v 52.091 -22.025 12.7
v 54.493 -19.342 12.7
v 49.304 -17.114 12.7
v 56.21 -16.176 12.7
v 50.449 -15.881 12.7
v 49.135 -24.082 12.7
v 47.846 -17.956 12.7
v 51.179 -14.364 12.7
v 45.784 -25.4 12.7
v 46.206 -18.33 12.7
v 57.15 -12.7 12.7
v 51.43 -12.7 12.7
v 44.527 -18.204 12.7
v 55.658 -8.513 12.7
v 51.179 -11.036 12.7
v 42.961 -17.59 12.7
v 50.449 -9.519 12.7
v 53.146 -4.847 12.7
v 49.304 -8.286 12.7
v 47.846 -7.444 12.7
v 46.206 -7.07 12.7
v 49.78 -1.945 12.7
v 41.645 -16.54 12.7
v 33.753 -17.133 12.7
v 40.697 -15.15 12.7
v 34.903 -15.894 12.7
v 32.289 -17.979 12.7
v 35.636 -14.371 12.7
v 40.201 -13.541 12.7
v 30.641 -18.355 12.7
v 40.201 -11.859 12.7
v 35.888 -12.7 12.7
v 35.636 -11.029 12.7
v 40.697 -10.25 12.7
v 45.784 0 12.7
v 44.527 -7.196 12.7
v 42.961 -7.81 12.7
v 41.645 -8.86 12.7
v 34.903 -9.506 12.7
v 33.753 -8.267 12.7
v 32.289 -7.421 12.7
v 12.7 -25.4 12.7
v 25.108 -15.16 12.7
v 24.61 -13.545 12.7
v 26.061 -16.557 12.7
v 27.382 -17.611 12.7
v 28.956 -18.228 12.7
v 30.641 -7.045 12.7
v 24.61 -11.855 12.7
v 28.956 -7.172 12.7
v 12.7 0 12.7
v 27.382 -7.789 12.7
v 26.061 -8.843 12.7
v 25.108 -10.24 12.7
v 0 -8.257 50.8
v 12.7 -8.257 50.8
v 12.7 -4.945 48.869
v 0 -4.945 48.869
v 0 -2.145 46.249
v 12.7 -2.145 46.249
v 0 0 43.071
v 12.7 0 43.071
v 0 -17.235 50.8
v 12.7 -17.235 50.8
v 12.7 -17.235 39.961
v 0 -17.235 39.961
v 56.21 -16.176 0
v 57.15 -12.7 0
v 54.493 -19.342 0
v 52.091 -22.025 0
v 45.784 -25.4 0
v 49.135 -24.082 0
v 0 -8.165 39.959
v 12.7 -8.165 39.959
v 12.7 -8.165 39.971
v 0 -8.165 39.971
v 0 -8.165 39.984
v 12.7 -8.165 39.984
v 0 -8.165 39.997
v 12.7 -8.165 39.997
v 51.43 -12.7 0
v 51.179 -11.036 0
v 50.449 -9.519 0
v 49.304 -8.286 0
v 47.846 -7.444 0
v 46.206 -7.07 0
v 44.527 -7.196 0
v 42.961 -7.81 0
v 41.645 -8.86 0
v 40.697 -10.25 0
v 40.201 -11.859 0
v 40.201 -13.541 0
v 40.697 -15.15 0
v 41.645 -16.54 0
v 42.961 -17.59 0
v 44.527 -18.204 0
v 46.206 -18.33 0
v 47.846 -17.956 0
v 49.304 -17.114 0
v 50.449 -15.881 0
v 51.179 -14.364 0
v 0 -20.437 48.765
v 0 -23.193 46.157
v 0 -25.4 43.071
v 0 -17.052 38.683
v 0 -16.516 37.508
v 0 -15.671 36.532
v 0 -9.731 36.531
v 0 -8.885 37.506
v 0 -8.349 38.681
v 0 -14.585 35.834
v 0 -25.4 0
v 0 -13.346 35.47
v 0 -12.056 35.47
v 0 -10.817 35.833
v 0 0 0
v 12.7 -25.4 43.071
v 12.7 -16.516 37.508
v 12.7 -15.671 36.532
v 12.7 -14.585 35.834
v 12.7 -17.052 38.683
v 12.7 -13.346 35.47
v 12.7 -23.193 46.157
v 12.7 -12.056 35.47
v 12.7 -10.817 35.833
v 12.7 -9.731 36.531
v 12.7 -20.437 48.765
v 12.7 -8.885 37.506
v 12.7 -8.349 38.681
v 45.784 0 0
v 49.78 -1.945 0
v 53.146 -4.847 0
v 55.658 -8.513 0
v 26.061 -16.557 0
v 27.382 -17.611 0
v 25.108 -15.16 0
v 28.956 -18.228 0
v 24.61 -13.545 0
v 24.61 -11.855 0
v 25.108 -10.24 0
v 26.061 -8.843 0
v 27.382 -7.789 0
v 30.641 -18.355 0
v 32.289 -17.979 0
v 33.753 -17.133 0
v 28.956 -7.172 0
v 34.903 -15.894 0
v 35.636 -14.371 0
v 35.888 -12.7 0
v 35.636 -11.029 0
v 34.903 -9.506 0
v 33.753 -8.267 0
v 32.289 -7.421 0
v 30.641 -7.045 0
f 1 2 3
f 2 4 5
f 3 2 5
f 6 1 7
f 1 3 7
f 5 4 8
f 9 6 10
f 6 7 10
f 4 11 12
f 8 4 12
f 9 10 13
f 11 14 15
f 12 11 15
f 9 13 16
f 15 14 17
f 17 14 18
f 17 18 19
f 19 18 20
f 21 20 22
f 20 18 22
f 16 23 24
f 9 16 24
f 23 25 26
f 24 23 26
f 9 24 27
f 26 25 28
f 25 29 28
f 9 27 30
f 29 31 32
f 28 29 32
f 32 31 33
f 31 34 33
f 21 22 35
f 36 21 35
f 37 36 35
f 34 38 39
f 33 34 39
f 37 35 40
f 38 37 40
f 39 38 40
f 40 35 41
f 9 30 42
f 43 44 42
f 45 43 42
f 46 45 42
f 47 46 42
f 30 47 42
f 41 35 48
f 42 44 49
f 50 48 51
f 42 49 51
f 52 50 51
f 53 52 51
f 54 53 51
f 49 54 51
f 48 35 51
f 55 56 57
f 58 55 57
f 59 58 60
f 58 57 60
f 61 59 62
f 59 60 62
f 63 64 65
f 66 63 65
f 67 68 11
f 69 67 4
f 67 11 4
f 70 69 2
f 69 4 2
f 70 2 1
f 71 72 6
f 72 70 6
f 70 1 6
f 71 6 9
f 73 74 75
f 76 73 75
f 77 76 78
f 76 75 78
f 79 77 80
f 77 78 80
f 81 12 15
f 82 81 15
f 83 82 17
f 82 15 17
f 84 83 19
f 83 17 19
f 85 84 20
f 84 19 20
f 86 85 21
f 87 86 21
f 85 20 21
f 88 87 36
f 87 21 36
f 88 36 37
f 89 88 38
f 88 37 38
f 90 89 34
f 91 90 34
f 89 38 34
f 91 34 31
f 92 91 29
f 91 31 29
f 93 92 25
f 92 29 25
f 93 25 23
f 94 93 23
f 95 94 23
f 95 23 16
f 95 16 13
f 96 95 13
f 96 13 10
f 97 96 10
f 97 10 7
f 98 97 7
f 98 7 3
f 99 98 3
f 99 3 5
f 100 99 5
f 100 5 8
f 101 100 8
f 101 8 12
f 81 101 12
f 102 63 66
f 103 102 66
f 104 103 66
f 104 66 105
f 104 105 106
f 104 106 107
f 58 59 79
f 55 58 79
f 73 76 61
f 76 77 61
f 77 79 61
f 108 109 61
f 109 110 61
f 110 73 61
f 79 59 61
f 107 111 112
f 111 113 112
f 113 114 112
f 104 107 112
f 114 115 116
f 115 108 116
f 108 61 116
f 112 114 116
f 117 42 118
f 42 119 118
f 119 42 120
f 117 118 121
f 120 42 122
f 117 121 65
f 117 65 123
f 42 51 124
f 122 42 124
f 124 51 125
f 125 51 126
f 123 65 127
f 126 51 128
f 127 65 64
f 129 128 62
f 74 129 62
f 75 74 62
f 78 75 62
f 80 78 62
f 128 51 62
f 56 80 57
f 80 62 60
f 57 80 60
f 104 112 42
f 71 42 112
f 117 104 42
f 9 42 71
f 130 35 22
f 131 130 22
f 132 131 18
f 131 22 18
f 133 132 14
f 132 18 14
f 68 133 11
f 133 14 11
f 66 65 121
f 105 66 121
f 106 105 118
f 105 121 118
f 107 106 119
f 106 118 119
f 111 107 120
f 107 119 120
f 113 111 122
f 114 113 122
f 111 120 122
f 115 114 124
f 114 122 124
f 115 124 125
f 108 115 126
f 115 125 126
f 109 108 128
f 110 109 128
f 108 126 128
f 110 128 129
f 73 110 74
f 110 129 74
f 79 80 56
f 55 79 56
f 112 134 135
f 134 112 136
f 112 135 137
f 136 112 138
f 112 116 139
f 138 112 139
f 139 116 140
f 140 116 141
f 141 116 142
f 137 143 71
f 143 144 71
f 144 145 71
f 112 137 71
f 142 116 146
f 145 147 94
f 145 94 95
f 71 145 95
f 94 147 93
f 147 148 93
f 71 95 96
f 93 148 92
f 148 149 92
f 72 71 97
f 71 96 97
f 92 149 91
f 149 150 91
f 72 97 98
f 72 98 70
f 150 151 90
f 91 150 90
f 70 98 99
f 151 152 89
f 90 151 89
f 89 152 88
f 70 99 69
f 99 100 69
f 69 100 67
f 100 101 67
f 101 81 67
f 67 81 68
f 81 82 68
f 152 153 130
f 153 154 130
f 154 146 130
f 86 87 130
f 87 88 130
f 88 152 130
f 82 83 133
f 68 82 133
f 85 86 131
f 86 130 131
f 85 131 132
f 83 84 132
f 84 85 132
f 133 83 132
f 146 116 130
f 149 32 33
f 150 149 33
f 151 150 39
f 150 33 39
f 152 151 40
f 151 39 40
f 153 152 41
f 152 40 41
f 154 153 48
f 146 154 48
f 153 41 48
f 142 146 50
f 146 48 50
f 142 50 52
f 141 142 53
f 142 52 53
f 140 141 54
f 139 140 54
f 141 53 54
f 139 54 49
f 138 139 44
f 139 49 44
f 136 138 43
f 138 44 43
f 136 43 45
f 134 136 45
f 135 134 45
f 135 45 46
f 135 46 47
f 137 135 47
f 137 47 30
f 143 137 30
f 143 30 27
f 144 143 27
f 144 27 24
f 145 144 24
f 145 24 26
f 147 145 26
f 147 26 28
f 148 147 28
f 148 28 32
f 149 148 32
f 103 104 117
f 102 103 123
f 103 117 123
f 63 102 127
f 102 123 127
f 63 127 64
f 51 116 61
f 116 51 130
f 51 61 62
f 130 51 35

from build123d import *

# Parameters (mm, degrees)
F1_DEPTH = 25.4
F3_DEPTH = 25.4
F5_DEPTH = 25.4
F6_R     = 5.646006
F6_R_2   = 5.670557
F7_DEPTH = 25.4


with BuildPart() as f1:
    # F0 (on Front) → F1 (new body)
    with BuildSketch(Plane.XZ):
        Polygon((0, 50.8), (0, 0), (57.15, 0), (57.15, 12.7), (12.7, 12.7), (12.7, 50.8), align=None)
    extrude(amount=F1_DEPTH)

    # F2 (on face) → F3 (cut)
    with BuildSketch(Plane.YZ.offset(12.7)):
        with BuildLine():
            ThreePointArc((-17.234911, 39.960572), (-12.701006, 35.423648), (-8.165089, 39.958559))
            ThreePointArc((-8.165089, 39.958559), (-8.16513, 39.977817), (-8.165252, 39.997075))
            ThreePointArc((-8.165252, 39.997075), (-12.718252, 44.493433), (-17.234911, 39.960572))
        make_face()
        with BuildLine():
            ThreePointArc((-25.4, 43.071147), (-21.877422, 47.527146), (-17.234911, 50.8))
            Line((-17.234911, 50.8), (-25.4, 50.8))
            Line((-25.4, 50.8), (-25.4, 43.071147))
        make_face()
        with BuildLine():
            ThreePointArc((-17.234911, 39.960572), (-12.718252, 44.493433), (-8.165252, 39.997075))
            Line((-8.165252, 39.997075), (-8.257007, 50.8))
            Line((-8.257007, 50.8), (-17.234911, 50.8))
            Line((-17.234911, 50.8), (-17.234911, 39.960572))
        make_face()
        with BuildLine():
            Line((0, 50.8), (-8.257007, 50.8))
            ThreePointArc((-8.257007, 50.8), (-3.471366, 47.637617), (0, 43.071147))
            Line((0, 43.071147), (0, 50.8))
        make_face()
    extrude(amount=-F3_DEPTH, mode=Mode.SUBTRACT)

    # F4 (on face) → F5 (cut)
    with BuildSketch(Plane.XY.offset(12.7)):
        with BuildLine():
            ThreePointArc((44.68115, 0), (52.530241, -4.764723), (57.15, -12.7))
            Line((57.15, -12.7), (57.15, 0))
            Line((57.15, 0), (44.68115, 0))
        make_face()
        with BuildLine():
            Line((57.15, -25.4), (57.15, -12.7))
            ThreePointArc((57.15, -12.7), (52.52777, -20.632851), (44.68115, -25.4))
            Line((44.68115, -25.4), (57.15, -25.4))
        make_face()
    extrude(amount=F5_DEPTH, mode=Mode.SUBTRACT)

    # F6 (on face) → F7 (cut)
    with BuildSketch(Plane.XY.offset(12.7)):
        with Locations((45.78362, -12.7)):
            Circle(F6_R)
        with Locations((30.217472, -12.7)):
            Circle(F6_R_2)
        with BuildLine():
            ThreePointArc((45.78362, 0), (53.145869, -4.847258), (57.15, -12.7))
            Line((57.15, -12.7), (57.15, 0))
            Line((57.15, 0), (45.78362, 0))
        make_face()
        with BuildLine():
            Line((57.15, -25.4), (57.15, -12.7))
            ThreePointArc((57.15, -12.7), (53.370398, -20.753693), (45.78362, -25.4))
            Line((45.78362, -25.4), (57.15, -25.4))
        make_face()
    extrude(amount=-F7_DEPTH, mode=Mode.SUBTRACT)


solid = f1.part
